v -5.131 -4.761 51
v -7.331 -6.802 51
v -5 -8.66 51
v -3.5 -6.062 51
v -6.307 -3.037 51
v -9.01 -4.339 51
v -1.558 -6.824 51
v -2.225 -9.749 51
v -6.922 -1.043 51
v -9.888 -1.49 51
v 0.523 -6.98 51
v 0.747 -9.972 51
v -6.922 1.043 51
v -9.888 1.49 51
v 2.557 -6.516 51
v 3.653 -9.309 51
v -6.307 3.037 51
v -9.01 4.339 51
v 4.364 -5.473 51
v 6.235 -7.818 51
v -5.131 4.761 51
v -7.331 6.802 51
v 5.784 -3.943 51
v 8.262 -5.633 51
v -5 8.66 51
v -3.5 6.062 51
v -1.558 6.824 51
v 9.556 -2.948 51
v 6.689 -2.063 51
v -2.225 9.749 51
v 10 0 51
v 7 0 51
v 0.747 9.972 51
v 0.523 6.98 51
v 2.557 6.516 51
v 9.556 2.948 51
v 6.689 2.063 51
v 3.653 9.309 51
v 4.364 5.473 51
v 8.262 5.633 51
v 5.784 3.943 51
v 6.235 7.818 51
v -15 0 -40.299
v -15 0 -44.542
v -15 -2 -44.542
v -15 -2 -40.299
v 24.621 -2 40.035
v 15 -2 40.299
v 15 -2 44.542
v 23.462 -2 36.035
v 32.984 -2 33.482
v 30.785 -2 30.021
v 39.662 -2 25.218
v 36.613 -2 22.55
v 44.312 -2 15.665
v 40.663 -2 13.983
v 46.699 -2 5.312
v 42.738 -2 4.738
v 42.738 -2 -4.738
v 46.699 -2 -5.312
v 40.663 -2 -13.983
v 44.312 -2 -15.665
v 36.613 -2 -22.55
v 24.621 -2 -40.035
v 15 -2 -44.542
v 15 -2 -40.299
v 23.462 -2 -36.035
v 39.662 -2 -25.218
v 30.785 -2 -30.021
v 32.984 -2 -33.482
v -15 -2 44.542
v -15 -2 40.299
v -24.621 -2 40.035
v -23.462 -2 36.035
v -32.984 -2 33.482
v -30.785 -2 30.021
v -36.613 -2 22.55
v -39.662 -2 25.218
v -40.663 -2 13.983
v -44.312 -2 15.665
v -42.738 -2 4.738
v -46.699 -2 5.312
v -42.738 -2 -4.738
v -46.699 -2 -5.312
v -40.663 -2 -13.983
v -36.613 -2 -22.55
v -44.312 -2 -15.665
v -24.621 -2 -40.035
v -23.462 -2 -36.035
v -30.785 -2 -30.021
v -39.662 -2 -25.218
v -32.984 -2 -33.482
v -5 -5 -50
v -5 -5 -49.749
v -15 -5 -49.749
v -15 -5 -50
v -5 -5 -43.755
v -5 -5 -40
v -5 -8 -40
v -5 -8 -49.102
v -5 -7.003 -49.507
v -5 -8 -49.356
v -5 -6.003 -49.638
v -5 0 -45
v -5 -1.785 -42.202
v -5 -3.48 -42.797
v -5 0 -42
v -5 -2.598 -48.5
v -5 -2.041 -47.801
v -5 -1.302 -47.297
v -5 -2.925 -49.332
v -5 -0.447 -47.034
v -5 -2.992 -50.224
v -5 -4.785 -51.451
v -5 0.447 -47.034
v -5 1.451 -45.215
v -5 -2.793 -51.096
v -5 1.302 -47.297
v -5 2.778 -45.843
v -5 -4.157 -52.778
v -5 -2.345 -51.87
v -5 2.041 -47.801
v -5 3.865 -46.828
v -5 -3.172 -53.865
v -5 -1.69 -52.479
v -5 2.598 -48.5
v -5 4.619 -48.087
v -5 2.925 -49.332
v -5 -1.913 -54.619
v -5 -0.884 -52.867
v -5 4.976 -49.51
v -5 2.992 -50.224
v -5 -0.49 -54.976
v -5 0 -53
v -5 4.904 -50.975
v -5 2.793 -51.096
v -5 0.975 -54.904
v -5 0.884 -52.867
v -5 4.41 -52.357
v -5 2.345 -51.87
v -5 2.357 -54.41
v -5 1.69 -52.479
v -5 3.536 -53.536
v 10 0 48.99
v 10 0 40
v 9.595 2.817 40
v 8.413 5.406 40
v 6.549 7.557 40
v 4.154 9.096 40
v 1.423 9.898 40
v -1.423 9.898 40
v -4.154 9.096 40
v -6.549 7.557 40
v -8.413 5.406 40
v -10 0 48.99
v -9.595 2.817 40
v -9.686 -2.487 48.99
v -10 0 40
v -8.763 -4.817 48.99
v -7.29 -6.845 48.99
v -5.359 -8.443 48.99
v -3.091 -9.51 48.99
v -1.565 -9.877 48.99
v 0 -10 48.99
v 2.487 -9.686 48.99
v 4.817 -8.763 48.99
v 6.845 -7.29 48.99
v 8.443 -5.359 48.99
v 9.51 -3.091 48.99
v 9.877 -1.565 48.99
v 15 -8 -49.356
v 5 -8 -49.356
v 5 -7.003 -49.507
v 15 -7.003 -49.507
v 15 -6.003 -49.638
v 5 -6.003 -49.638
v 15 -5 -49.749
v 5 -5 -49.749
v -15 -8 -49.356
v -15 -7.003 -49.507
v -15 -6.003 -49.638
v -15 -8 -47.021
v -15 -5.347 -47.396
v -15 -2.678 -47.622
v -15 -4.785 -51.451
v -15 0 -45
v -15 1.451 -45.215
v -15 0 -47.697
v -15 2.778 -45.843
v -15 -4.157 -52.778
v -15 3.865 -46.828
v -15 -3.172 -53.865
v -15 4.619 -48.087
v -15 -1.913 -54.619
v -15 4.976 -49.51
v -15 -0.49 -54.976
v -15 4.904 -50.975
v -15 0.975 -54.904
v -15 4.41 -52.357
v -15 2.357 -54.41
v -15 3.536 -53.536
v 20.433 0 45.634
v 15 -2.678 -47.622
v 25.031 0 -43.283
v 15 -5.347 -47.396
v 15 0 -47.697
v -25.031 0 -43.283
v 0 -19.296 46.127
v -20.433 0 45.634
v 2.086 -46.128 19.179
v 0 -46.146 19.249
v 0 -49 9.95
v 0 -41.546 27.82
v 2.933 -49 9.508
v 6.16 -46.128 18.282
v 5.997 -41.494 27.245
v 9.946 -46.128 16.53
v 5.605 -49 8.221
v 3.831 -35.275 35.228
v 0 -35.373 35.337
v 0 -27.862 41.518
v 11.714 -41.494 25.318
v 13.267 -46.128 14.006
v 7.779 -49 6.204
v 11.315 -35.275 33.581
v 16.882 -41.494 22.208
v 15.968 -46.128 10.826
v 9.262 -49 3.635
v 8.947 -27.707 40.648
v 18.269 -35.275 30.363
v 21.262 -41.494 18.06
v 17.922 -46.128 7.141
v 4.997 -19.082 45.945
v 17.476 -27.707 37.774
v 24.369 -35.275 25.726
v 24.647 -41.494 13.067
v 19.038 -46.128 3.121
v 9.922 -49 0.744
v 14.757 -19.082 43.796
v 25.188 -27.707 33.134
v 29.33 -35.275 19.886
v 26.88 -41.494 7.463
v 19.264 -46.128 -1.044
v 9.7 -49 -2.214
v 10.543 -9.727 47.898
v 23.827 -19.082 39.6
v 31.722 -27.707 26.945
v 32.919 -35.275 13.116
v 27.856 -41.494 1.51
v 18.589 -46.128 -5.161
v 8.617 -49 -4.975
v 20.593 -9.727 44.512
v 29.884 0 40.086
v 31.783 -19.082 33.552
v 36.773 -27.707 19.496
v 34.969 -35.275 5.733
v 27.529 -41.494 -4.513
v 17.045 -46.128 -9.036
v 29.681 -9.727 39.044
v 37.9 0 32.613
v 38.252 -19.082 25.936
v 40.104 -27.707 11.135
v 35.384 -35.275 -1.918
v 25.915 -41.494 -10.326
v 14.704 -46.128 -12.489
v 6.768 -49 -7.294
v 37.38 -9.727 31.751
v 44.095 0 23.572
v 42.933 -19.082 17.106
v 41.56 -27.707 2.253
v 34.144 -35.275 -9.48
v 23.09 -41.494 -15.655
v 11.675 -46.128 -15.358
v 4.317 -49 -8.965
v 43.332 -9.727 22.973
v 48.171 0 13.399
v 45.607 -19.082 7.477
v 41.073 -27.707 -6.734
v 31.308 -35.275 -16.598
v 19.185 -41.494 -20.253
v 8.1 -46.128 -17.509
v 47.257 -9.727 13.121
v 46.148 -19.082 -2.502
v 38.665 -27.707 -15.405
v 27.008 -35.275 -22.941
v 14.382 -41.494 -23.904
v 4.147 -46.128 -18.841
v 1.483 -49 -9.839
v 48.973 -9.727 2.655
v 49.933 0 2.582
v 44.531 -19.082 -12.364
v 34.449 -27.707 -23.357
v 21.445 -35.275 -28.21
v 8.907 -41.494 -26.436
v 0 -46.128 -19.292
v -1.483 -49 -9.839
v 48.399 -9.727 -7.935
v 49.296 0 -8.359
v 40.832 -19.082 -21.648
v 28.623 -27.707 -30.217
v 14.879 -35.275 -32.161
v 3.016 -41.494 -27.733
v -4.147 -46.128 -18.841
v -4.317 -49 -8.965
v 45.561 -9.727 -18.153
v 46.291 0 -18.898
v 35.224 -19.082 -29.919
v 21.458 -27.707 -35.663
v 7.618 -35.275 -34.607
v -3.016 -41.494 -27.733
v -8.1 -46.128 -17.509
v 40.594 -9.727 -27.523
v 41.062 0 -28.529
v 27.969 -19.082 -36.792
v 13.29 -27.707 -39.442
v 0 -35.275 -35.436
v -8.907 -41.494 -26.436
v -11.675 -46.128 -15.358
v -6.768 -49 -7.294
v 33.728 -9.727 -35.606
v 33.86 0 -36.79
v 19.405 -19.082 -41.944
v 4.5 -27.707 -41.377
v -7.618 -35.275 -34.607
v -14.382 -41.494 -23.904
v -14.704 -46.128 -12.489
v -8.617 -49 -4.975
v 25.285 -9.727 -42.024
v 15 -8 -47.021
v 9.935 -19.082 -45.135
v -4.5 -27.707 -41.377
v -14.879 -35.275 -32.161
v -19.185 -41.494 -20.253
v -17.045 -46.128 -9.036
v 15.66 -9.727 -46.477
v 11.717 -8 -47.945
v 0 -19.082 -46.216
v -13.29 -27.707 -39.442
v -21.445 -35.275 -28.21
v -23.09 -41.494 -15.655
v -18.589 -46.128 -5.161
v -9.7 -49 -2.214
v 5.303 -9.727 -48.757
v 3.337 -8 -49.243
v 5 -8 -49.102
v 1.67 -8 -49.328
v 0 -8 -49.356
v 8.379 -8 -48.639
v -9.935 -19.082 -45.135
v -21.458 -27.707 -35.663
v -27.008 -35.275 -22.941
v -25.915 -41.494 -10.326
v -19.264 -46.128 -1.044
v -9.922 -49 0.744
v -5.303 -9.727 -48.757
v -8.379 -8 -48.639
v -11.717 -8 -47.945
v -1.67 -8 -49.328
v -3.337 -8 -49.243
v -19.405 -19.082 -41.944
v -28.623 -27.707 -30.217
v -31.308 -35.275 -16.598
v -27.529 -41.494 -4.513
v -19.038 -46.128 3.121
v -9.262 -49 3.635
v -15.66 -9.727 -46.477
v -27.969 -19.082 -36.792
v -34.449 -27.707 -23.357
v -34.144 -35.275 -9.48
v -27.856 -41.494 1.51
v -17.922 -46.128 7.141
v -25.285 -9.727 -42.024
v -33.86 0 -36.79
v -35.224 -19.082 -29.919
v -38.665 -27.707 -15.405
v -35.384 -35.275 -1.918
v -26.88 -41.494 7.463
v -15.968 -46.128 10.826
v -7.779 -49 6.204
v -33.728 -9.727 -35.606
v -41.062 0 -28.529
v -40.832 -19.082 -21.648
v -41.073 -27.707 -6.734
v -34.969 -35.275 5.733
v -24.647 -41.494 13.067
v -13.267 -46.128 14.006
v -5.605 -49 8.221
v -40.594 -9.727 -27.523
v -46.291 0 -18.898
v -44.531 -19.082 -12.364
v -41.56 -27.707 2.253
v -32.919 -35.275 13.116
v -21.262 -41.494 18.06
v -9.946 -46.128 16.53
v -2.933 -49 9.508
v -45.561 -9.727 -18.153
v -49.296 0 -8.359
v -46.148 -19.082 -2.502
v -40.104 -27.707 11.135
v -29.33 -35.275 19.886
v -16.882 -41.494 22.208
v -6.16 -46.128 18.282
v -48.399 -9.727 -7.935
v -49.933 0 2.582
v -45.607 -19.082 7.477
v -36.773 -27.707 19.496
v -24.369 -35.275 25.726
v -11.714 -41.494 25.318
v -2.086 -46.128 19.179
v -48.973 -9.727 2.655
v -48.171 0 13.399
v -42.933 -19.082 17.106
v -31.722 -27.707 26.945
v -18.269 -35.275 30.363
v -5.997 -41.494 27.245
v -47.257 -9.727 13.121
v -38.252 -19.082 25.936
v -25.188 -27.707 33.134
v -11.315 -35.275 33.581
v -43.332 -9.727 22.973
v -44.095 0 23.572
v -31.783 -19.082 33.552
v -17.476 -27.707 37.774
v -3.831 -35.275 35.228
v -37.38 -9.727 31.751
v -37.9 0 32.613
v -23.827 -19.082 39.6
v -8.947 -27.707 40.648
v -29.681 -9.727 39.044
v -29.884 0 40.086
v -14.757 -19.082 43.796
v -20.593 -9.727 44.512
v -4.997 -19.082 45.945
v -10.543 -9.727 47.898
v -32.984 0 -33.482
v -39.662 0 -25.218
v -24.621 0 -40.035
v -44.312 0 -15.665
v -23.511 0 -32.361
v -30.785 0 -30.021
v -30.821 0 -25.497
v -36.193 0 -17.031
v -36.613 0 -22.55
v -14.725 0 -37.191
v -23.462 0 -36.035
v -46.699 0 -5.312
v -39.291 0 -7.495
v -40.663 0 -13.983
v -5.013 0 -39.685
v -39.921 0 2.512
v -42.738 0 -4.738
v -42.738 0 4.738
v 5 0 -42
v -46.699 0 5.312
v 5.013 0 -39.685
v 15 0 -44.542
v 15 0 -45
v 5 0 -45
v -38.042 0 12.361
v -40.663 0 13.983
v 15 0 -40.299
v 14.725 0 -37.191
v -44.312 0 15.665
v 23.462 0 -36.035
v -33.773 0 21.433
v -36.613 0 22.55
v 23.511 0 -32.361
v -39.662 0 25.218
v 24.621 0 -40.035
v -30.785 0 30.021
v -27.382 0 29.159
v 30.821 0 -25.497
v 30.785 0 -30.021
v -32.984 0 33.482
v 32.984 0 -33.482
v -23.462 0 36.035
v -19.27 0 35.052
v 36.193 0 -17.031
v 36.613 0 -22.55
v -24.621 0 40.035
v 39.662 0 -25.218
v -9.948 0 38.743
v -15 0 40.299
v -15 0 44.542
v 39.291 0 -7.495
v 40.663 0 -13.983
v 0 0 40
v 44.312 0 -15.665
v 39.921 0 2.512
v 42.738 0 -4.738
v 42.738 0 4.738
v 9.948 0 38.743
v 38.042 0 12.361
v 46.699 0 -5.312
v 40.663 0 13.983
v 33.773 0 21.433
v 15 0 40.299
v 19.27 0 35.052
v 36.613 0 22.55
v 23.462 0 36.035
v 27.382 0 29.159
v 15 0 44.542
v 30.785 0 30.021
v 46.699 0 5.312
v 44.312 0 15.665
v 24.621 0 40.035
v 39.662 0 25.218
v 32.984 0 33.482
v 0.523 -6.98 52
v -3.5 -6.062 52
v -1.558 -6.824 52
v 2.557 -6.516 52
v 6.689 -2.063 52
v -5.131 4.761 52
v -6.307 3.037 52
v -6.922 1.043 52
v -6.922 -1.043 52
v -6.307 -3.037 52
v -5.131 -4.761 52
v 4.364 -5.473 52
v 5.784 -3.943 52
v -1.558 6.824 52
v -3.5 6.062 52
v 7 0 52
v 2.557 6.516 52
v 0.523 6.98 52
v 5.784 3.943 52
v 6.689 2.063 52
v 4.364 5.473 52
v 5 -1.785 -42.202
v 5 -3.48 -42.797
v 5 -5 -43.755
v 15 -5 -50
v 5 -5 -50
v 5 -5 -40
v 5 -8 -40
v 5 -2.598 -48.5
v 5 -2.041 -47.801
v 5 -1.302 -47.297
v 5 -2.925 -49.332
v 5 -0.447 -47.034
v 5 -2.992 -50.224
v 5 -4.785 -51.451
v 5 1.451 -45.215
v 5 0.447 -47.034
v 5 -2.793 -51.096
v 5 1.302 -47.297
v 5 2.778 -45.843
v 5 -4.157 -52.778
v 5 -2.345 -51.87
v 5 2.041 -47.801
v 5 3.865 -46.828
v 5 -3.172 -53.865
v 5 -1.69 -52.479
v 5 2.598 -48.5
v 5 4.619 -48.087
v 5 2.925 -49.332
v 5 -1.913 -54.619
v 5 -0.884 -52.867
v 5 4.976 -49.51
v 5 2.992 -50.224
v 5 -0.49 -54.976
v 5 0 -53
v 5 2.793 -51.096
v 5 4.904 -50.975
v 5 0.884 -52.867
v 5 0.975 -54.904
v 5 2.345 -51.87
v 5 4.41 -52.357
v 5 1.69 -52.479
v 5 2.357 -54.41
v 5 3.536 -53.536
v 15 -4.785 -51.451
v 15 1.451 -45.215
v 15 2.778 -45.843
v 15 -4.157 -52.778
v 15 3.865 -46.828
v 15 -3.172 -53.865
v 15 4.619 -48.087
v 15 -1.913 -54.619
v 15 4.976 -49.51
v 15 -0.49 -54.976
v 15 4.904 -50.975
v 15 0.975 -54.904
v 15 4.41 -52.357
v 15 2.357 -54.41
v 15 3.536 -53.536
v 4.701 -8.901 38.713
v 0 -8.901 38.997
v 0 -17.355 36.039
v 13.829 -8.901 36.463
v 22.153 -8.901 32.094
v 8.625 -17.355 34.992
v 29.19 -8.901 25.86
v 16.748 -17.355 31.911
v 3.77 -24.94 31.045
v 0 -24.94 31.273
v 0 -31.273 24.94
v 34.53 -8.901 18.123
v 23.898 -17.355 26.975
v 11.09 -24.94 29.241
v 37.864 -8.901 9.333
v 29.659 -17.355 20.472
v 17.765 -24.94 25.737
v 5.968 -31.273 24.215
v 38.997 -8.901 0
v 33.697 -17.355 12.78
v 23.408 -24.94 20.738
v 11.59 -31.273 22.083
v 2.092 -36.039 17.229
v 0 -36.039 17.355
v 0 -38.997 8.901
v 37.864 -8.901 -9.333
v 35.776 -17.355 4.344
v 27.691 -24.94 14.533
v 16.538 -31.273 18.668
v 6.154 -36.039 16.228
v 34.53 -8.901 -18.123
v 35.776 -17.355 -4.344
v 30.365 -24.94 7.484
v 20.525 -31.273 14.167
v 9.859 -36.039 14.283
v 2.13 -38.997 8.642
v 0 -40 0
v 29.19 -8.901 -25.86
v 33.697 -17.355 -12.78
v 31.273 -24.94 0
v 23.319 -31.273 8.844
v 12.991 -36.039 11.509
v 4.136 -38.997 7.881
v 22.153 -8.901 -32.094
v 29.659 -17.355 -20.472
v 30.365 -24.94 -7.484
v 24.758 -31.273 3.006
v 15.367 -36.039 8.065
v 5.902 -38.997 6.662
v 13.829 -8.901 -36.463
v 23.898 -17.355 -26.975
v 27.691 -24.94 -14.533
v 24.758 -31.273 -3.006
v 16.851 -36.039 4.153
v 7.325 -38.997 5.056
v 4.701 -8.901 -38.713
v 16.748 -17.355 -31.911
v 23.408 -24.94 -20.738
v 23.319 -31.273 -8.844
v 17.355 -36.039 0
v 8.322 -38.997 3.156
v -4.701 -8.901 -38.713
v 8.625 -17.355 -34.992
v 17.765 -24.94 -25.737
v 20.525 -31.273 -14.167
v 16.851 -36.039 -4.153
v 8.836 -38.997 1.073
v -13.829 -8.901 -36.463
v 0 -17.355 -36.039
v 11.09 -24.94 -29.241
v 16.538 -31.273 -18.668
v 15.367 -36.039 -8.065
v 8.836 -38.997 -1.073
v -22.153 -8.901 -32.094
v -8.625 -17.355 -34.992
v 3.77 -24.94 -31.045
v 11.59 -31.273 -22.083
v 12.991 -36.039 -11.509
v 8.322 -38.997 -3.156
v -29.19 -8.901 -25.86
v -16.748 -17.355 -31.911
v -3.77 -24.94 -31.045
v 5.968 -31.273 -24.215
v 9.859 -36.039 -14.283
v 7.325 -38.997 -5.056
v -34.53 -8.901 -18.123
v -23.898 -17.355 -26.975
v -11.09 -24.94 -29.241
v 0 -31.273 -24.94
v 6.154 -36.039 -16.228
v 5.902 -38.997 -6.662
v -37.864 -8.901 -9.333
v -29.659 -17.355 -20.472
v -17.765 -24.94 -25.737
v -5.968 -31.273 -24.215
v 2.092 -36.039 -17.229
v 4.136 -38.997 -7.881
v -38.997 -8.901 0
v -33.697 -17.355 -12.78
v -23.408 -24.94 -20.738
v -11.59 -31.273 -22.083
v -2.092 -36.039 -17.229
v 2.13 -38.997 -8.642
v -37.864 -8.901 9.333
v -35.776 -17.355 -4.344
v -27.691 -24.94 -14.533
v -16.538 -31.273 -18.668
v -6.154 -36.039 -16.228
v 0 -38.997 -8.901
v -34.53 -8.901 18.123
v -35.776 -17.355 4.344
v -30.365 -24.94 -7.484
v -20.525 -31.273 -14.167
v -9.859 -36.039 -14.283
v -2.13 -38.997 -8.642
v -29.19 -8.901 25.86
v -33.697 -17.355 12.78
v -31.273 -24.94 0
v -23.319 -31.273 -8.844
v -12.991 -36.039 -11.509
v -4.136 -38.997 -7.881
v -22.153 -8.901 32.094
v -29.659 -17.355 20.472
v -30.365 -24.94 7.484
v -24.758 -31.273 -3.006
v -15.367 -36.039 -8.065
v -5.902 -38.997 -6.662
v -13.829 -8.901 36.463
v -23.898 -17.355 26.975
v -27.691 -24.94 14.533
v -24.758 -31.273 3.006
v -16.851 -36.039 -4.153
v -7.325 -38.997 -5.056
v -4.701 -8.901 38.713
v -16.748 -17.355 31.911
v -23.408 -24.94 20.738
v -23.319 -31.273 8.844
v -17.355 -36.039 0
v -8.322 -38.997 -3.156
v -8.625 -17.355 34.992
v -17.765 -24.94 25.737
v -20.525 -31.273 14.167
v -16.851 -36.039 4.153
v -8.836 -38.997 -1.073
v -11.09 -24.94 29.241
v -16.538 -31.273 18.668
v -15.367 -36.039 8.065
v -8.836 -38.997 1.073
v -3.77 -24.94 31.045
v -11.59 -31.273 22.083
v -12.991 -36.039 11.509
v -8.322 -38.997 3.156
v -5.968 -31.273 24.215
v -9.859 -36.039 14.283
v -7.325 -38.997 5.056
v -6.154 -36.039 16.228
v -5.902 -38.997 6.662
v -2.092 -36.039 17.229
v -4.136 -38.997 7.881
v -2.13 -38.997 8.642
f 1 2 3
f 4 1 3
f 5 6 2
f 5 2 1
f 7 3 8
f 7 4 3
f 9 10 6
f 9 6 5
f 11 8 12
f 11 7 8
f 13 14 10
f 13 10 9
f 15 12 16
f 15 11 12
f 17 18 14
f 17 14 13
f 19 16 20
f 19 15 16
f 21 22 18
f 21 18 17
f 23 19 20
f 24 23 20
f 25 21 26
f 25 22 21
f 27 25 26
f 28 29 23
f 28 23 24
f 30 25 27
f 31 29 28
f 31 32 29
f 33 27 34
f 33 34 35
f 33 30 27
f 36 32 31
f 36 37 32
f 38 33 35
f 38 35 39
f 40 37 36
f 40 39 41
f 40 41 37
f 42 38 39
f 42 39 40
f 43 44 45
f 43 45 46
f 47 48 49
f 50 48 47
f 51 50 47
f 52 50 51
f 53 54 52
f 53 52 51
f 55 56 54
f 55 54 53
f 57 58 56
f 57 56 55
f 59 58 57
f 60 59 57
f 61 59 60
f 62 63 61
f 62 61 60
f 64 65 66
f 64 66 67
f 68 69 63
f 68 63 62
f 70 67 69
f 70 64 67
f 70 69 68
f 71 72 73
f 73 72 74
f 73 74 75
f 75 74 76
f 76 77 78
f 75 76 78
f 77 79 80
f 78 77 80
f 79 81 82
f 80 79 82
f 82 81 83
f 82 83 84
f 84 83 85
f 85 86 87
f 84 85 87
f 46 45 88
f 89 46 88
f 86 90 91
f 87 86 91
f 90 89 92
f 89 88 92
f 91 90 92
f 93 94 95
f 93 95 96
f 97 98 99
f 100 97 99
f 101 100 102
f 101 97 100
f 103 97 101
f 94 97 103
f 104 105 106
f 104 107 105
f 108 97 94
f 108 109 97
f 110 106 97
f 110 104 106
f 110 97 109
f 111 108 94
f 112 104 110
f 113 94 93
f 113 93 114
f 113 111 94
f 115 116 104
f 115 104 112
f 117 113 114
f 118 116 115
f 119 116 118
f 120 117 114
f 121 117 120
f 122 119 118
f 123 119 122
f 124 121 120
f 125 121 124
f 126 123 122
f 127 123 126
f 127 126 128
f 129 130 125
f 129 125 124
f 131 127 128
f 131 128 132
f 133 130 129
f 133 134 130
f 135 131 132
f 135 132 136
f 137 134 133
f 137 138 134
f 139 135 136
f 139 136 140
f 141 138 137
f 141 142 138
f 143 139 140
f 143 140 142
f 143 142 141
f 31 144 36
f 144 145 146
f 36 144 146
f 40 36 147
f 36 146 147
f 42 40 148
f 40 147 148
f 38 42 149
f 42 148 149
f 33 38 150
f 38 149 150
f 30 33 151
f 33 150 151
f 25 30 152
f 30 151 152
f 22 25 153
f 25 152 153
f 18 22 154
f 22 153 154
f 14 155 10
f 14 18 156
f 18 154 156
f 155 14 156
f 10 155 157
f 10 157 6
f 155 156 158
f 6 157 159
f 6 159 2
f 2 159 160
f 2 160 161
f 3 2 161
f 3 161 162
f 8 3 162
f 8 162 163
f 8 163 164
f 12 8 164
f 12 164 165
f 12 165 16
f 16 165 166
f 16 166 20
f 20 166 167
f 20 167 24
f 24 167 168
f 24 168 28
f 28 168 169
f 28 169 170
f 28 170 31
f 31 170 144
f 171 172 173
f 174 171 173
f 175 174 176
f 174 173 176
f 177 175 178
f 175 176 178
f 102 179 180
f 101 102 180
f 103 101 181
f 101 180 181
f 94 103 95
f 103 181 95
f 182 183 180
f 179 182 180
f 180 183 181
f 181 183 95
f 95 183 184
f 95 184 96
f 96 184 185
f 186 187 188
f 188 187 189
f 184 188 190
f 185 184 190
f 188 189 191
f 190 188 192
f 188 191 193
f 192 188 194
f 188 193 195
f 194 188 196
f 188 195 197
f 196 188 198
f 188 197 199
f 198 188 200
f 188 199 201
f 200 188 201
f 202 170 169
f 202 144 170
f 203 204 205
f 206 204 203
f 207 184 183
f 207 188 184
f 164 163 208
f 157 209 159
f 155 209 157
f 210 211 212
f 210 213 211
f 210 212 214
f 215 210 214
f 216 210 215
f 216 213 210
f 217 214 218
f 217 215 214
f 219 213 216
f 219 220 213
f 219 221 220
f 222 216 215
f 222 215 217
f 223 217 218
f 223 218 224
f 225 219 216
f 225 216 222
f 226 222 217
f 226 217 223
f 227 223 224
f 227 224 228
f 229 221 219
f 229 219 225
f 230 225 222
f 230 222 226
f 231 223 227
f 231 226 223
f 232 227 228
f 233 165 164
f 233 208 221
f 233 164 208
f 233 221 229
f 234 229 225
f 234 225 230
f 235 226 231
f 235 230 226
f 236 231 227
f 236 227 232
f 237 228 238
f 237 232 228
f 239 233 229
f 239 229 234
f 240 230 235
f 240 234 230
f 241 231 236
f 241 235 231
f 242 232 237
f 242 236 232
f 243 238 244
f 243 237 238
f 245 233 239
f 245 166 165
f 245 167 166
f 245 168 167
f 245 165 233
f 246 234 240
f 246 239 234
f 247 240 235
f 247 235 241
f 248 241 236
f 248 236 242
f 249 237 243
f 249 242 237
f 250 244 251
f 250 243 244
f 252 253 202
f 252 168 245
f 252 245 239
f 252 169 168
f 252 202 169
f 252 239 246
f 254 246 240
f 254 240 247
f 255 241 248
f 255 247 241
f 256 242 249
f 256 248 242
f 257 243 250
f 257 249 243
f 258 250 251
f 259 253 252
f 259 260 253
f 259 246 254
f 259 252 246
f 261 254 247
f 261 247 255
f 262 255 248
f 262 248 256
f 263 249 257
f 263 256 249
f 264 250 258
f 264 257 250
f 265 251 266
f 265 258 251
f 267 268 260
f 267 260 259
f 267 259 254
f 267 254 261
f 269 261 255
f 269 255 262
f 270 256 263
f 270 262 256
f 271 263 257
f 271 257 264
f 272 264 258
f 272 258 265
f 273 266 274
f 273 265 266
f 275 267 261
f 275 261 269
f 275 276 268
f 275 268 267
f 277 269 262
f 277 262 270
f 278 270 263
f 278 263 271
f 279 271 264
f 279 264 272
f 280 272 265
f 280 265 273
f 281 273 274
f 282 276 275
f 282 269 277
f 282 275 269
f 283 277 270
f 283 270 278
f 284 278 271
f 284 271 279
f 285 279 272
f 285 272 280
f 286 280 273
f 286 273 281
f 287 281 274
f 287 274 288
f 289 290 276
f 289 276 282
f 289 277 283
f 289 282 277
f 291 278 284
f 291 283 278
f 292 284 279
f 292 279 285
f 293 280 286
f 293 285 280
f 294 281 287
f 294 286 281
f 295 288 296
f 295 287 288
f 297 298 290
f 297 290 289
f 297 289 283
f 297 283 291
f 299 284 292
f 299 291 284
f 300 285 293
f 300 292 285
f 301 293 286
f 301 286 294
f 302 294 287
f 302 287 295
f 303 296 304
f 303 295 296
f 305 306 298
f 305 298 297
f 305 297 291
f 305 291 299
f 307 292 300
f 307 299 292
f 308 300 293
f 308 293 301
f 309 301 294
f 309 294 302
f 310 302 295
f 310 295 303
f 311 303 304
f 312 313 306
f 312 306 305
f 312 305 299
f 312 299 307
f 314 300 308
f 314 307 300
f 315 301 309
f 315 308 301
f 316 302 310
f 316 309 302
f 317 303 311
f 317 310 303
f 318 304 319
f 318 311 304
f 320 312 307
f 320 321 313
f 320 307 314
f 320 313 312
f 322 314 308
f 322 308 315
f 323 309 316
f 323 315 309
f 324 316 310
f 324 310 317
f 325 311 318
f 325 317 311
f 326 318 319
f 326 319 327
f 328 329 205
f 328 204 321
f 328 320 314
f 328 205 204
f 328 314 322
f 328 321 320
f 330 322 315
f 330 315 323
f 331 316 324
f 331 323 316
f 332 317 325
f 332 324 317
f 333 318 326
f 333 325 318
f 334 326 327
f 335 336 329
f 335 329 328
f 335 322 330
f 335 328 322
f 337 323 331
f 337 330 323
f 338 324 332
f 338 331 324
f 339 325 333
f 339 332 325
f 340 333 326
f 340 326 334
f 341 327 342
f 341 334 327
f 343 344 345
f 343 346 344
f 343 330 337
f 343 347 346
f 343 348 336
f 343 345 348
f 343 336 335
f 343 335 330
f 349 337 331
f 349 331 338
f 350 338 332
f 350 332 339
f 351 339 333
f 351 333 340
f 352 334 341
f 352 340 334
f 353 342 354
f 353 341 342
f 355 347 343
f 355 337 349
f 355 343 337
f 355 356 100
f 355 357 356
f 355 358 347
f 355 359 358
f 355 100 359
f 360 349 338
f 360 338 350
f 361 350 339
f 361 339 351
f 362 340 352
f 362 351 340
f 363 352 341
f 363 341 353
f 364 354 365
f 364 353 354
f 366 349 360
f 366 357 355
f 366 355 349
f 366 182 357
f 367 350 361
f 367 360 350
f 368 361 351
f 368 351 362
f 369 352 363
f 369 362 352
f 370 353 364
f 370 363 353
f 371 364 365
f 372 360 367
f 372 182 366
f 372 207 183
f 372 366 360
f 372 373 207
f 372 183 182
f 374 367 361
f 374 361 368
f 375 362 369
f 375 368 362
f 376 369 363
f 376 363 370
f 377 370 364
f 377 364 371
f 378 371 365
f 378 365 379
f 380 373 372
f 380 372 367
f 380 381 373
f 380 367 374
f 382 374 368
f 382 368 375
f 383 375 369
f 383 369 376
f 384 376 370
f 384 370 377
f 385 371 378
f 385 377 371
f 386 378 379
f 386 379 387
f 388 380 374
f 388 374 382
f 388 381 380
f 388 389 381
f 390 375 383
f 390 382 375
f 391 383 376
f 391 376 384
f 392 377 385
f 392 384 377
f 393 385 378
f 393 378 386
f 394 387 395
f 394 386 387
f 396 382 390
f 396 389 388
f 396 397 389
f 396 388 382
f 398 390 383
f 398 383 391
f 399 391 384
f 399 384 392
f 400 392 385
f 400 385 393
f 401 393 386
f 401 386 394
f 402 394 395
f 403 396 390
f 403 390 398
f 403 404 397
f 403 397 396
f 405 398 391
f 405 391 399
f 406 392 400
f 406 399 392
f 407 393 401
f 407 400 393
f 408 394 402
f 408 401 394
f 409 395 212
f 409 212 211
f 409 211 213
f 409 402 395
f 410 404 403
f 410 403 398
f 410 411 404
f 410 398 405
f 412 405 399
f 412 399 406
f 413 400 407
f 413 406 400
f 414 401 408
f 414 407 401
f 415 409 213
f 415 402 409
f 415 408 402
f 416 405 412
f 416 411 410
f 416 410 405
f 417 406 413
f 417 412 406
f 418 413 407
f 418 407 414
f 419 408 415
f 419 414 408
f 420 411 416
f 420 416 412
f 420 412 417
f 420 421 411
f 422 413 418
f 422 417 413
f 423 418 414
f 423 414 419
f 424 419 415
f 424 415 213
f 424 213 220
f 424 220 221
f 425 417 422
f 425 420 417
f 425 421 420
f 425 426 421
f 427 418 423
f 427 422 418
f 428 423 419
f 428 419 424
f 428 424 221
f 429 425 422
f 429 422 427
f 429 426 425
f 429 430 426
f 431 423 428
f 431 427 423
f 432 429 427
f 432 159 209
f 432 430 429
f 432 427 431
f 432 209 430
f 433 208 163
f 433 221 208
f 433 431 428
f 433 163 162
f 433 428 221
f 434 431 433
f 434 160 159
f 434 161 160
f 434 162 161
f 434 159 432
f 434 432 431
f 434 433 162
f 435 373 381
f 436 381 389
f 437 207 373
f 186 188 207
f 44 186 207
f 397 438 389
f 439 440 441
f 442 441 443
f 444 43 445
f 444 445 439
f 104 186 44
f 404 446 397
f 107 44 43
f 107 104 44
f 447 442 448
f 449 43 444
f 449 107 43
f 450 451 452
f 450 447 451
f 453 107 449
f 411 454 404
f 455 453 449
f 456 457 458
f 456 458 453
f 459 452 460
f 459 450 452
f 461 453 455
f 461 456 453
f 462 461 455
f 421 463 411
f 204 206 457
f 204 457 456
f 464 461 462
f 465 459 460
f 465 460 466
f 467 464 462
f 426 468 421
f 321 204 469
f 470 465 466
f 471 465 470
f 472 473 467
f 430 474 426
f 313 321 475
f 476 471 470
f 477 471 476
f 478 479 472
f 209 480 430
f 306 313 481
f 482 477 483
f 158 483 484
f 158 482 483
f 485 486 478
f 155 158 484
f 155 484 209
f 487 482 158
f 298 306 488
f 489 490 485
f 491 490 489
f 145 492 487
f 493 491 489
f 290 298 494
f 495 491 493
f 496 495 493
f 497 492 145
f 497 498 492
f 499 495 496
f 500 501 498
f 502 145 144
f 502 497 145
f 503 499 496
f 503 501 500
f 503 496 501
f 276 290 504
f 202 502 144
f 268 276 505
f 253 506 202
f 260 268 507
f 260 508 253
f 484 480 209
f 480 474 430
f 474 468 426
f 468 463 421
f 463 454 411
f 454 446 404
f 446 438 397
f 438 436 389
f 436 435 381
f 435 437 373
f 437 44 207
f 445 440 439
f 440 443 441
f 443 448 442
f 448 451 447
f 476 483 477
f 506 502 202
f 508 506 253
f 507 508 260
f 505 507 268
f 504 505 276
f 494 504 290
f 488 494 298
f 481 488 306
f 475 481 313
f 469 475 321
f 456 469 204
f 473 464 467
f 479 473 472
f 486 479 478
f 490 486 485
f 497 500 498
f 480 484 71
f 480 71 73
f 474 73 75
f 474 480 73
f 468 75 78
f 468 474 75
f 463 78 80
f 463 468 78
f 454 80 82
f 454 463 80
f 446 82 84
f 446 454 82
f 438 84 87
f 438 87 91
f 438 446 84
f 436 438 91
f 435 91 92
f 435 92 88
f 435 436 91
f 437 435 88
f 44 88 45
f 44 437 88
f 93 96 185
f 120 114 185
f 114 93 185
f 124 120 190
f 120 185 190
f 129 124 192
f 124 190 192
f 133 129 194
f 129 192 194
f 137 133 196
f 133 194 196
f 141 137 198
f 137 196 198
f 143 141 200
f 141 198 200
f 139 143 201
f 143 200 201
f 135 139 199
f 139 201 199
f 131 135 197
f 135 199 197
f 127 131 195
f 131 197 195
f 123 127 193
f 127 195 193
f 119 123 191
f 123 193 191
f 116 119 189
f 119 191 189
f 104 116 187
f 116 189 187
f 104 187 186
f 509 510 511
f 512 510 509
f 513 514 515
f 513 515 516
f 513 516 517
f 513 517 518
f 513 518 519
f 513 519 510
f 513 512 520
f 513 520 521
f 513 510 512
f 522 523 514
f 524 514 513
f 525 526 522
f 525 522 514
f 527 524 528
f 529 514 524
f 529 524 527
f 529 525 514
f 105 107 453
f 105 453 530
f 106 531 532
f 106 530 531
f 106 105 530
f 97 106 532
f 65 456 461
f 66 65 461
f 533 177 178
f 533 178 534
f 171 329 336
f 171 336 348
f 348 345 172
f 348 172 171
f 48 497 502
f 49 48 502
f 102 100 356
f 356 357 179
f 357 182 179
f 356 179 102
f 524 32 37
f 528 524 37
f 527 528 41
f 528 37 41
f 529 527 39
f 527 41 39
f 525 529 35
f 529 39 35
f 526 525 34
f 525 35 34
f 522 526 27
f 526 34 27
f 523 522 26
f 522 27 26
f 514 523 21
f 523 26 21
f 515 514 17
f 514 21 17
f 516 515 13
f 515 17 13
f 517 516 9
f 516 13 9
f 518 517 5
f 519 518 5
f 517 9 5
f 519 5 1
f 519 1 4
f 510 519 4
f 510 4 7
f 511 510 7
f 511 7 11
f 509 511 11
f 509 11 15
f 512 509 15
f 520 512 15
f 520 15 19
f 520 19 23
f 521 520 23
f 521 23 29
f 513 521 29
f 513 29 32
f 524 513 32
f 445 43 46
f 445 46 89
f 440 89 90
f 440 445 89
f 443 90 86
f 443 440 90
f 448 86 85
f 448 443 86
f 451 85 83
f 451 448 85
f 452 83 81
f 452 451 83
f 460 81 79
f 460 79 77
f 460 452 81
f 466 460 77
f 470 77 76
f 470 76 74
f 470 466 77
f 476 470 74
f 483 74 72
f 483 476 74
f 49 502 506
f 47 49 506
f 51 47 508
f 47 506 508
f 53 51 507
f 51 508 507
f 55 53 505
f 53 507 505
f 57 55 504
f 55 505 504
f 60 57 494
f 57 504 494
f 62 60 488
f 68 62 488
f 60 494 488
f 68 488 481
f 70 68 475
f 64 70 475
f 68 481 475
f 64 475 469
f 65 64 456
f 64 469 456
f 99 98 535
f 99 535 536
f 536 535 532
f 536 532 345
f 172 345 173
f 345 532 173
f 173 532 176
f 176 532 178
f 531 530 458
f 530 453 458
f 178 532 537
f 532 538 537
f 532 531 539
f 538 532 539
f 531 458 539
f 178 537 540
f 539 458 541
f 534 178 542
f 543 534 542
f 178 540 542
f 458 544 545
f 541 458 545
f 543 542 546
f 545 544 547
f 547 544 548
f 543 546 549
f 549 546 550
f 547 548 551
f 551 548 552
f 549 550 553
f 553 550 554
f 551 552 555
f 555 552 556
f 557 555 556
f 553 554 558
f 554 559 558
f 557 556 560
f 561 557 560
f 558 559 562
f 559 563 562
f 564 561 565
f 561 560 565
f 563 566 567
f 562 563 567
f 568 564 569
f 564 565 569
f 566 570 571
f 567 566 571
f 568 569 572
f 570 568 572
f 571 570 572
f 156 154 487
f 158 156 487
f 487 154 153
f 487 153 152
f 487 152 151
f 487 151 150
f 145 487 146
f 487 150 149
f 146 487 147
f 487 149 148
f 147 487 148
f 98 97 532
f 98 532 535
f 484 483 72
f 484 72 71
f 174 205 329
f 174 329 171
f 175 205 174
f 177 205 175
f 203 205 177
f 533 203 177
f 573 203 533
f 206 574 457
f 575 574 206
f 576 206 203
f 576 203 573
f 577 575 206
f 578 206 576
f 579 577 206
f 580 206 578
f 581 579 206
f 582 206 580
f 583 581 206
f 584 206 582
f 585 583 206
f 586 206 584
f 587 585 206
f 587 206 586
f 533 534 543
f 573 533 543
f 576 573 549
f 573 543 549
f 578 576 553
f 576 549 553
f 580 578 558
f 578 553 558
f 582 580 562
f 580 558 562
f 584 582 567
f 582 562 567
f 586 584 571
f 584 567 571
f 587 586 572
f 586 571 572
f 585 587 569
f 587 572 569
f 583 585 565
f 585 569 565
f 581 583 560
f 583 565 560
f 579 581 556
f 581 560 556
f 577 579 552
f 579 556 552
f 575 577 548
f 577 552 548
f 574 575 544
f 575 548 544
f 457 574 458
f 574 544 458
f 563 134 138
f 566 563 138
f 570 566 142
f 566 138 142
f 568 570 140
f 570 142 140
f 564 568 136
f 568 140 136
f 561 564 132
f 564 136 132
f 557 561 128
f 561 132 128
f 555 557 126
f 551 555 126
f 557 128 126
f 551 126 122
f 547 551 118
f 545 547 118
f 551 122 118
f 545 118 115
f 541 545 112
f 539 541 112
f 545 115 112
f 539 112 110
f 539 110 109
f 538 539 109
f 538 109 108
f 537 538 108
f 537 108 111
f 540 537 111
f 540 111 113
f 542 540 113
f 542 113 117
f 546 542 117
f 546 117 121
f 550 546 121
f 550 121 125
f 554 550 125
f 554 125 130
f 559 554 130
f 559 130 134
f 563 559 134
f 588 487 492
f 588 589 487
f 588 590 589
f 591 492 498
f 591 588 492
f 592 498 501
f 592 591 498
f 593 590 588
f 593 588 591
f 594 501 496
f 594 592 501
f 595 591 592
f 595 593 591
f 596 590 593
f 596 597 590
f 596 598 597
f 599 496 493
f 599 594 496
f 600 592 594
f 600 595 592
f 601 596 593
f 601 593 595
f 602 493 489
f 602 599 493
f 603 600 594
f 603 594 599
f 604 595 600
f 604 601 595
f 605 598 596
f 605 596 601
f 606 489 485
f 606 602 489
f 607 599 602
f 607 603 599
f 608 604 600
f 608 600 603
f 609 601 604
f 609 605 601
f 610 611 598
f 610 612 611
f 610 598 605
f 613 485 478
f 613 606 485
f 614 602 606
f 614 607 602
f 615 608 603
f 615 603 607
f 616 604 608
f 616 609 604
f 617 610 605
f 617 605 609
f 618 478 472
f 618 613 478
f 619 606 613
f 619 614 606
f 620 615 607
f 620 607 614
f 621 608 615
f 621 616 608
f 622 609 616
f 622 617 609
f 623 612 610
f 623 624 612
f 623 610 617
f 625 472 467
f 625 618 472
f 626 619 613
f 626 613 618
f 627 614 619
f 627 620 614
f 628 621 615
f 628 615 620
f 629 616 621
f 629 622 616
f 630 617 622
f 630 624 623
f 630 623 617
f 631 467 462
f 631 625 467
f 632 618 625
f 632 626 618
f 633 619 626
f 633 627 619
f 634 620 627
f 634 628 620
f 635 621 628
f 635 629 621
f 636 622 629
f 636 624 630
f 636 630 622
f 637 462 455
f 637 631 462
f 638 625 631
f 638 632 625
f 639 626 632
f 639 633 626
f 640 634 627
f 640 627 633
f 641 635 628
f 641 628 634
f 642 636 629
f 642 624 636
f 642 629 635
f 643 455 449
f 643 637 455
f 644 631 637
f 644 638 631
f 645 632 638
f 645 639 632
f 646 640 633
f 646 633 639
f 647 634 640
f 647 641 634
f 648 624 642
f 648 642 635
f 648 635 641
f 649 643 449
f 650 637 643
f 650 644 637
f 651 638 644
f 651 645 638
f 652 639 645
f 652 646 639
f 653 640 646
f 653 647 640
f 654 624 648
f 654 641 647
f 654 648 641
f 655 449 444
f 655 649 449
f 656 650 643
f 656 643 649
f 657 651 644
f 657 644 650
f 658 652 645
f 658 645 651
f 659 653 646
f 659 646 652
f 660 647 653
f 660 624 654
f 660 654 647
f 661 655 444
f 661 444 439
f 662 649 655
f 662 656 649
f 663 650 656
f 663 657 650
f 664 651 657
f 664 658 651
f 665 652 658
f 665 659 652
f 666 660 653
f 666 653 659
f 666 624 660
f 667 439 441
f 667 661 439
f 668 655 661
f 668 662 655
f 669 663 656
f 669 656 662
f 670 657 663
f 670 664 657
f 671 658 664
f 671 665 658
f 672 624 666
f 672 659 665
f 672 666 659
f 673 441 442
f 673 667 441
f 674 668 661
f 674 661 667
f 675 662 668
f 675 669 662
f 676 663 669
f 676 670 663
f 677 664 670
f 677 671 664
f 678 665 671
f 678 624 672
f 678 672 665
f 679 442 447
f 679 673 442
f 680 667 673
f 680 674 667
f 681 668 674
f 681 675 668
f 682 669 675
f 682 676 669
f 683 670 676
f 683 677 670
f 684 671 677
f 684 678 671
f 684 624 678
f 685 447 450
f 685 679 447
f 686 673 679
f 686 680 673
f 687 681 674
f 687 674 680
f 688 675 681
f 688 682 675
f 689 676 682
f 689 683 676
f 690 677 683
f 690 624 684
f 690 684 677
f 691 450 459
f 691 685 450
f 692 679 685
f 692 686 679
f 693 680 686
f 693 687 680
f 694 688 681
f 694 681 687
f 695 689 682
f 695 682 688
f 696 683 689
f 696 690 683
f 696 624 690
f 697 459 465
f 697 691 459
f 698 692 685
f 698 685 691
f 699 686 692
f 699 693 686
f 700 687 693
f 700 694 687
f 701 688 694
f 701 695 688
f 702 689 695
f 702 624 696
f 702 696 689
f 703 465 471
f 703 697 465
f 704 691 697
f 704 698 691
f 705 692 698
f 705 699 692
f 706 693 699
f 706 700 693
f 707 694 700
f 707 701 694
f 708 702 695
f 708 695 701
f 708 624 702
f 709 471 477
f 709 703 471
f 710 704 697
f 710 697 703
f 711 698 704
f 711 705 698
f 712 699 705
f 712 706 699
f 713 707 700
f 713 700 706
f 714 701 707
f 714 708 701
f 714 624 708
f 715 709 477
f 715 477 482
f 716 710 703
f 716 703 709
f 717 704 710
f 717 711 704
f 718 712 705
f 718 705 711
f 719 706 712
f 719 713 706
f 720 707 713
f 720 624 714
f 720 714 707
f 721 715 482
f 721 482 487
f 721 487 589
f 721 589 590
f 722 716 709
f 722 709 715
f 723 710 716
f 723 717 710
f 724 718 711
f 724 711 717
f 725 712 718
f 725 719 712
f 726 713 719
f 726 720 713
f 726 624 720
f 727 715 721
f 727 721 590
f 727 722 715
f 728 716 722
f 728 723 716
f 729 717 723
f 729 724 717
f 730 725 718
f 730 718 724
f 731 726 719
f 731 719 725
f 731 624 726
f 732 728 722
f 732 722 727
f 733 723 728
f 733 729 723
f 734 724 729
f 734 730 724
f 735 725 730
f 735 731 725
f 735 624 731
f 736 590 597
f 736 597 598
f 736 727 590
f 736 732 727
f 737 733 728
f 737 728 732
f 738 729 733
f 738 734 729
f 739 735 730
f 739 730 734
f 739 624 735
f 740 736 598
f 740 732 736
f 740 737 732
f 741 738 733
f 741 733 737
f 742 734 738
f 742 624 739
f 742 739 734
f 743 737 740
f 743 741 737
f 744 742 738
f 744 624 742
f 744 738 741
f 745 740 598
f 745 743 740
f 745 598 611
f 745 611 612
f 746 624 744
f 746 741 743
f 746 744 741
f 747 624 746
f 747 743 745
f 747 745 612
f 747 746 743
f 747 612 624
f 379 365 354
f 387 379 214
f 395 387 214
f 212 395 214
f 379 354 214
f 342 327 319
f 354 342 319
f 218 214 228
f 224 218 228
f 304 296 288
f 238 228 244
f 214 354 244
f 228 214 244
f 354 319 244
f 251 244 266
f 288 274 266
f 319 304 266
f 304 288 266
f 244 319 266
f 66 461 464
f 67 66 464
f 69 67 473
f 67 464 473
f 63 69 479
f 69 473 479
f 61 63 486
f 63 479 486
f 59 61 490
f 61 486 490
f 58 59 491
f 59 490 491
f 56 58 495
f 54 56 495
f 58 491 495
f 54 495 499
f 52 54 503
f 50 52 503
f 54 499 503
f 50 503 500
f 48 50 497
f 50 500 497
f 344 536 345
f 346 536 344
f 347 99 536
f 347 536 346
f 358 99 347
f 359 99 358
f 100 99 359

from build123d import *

# Parameters (mm, degrees)
CUT_EXTRUDE1_DEPTH       = 15
CUT_EXTRUDE1_DEPTH_BACK  = 15
SKETCH5_R                = 8
BOSS_EXTRUDE1_DEPTH      = 15
BOSS_EXTRUDE1_DEPTH_BACK = 15
SKETCH6_R                = 5
CUT_EXTRUDE2_DEPTH       = 5
CUT_EXTRUDE2_DEPTH_BACK  = 5
SKETCH7_R                = 5
BOSS_EXTRUDE2_DEPTH      = 5
BOSS_EXTRUDE2_DEPTH_BACK = 5
SKETCH8_R                = 3
SKETCH9_W                = 10
SKETCH9_H                = 5
BOSS_EXTRUDE3_DEPTH      = 10
LPATTERN1_COUNT          = 2
LPATTERN1_PITCH          = 20
BOSS_EXTRUDE4_DEPTH      = 1
BOSS_EXTRUDE4_DEPTH_BACK = 10
SKETCH10_R               = 10
SKETCH11_R               = 7
BOSS_EXTRUDE5_DEPTH      = 2
CUT_EXTRUDE5_DEPTH       = 2
BOSS_EXTRUDE6_DEPTH      = 15
BOSS_EXTRUDE6_DEPTH_BACK = 15
CUT_EXTRUDE6_DEPTH       = 5
CUT_EXTRUDE6_DEPTH_BACK  = 5
SKETCH15_R               = 10
CUT_EXTRUDE7_DEPTH       = 1


with BuildPart() as part:
    # Sketch3 → Revolve2 (revolve)
    with BuildSketch(Plane(origin=(0, 0, 0), x_dir=(0, 0, -1), z_dir=(1, 0, 0))):
        with BuildLine():
            Line((50, 0), (40, 0))
            ThreePointArc((40, 0), (28.284271247, -28.284271247), (0, -40))
            Line((0, -40), (0, -50))
            ThreePointArc((0, -50), (35.355339059, -35.355339059), (50, 0))
        make_face()
    revolve(axis=Axis((0, 0, 0), (0, 1, 0)))

    # Sketch5 → Cut-Extrude1 (cut, two sides: drawn at the far end of the back side and taken through both)
    with BuildSketch(Plane(origin=(0, 0, 0), x_dir=(0, 0, -1), z_dir=(1, 0, 0)).offset(-CUT_EXTRUDE1_DEPTH_BACK)):
        with Locations((50, 0)):
            Circle(SKETCH5_R)
    extrude(amount=CUT_EXTRUDE1_DEPTH + CUT_EXTRUDE1_DEPTH_BACK, mode=Mode.SUBTRACT)

    # Sketch6 → Boss-Extrude1 (add, two sides: drawn at the far end of the back side and taken through both)
    with BuildSketch(Plane(origin=(0, 0, 0), x_dir=(0, 0, -1), z_dir=(1, 0, 0)).offset(-BOSS_EXTRUDE1_DEPTH_BACK)):
        with Locations((50, 0)):
            Circle(SKETCH6_R)
    extrude(amount=BOSS_EXTRUDE1_DEPTH + BOSS_EXTRUDE1_DEPTH_BACK)

    # Sketch7 → Cut-Extrude2 (cut, two sides: drawn at the far end of the back side and taken through both)
    with BuildSketch(Plane(origin=(0, 0, 0), x_dir=(0, 0, -1), z_dir=(1, 0, 0)).offset(-CUT_EXTRUDE2_DEPTH_BACK)):
        with Locations((50, 0)):
            Circle(SKETCH7_R)
    extrude(amount=CUT_EXTRUDE2_DEPTH + CUT_EXTRUDE2_DEPTH_BACK, mode=Mode.SUBTRACT)

    # Sketch8 → Boss-Extrude2 (add, two sides: drawn at the far end of the back side and taken through both)
    with BuildSketch(Plane(origin=(0, 0, 0), x_dir=(0, 0, -1), z_dir=(1, 0, 0)).offset(-BOSS_EXTRUDE2_DEPTH_BACK)):
        with Locations((50, 0)):
            Circle(SKETCH8_R)
    extrude(amount=BOSS_EXTRUDE2_DEPTH + BOSS_EXTRUDE2_DEPTH_BACK)

    # Sketch9 → Boss-Extrude3 (add)
    with BuildSketch(Plane(origin=(15, 0, 0), x_dir=(0, 0, -1), z_dir=(1, 0, 0))):
        with Locations((45, -2.5)):
            Rectangle(SKETCH9_W, SKETCH9_H)
    boss_extrude3 = extrude(amount=-BOSS_EXTRUDE3_DEPTH)

    # LPattern1: Boss-Extrude3 ×2
    with Locations(*[(-i * LPATTERN1_PITCH, 0, 0) for i in range(1, LPATTERN1_COUNT)]):
        add(boss_extrude3)

    # Sketch10 → Boss-Extrude4 (add, two sides: drawn at the far end of the back side and taken through both)
    with BuildSketch(Plane.XY.offset(50).offset(-BOSS_EXTRUDE4_DEPTH_BACK)):
        Circle(SKETCH10_R)
    extrude(amount=BOSS_EXTRUDE4_DEPTH + BOSS_EXTRUDE4_DEPTH_BACK)

    # Sketch11 → Boss-Extrude5 (add)
    with BuildSketch(Plane.XY.offset(50)):
        Circle(SKETCH11_R)
    extrude(amount=BOSS_EXTRUDE5_DEPTH)

    # Sketch12 → Cut-Extrude5 (cut)
    with BuildSketch(Plane(origin=(0, 0, 0), x_dir=(1, 0, 0), z_dir=(0, 1, 0))):
        with BuildLine():
            Line((-15, 44.542094894), (-15, 40.298883359))
            ThreePointArc((-15, 40.298883359), (-43, 0), (-15, -40.298883359))
            Line((-15, -40.298883359), (-15, -44.542094894))
            ThreePointArc((-15, -44.542094894), (-46.999981038, 0), (-15, 44.542094894))
        make_face()
        with BuildLine():
            Line((15, 44.542094894), (15, 40.298883359))
            ThreePointArc((15, 40.298883359), (43, 0), (15, -40.298883359))
            Line((15, -40.298883359), (15, -44.542094894))
            ThreePointArc((15, -44.542094894), (46.999981038, 0), (15, 44.542094894))
        make_face()
    extrude(amount=-CUT_EXTRUDE5_DEPTH, mode=Mode.SUBTRACT)

    # Sketch13 → Boss-Extrude6 (add, two sides: drawn at the far end of the back side and taken through both)
    with BuildSketch(Plane(origin=(0, 0, 0), x_dir=(0, 0, -1), z_dir=(1, 0, 0)).offset(-BOSS_EXTRUDE6_DEPTH_BACK)):
        with BuildLine():
            Line((49.749371855, -5), (40, -5))
            Line((40, -5), (40, -8))
            Line((40, -8), (49.355850717, -8))
            ThreePointArc((49.355850717, -8), (49.57530923, -6.502977374), (49.749371855, -5))
        make_face()
    extrude(amount=BOSS_EXTRUDE6_DEPTH + BOSS_EXTRUDE6_DEPTH_BACK)

    # Sketch14 → Cut-Extrude6 (cut, two sides: drawn at the far end of the back side and taken through both)
    with BuildSketch(Plane(origin=(0, 0, 0), x_dir=(0, 0, -1), z_dir=(1, 0, 0)).offset(-CUT_EXTRUDE6_DEPTH_BACK)):
        with BuildLine():
            Line((49.749371855, -5), (40, -5))
            Line((40, -5), (40, -8))
            Line((40, -8), (49.355850717, -8))
            ThreePointArc((49.355850717, -8), (49.57530923, -6.502977374), (49.749371855, -5))
        make_face()
    extrude(amount=CUT_EXTRUDE6_DEPTH + CUT_EXTRUDE6_DEPTH_BACK, mode=Mode.SUBTRACT)

    # Sketch15 → Cut-Extrude7 (cut)
    with BuildSketch(Plane(origin=(0, -50, 0), x_dir=(1, 0, 0), z_dir=(0, 1, 0))):
        Circle(SKETCH15_R)
    extrude(amount=CUT_EXTRUDE7_DEPTH, mode=Mode.SUBTRACT)


solid = part.part
